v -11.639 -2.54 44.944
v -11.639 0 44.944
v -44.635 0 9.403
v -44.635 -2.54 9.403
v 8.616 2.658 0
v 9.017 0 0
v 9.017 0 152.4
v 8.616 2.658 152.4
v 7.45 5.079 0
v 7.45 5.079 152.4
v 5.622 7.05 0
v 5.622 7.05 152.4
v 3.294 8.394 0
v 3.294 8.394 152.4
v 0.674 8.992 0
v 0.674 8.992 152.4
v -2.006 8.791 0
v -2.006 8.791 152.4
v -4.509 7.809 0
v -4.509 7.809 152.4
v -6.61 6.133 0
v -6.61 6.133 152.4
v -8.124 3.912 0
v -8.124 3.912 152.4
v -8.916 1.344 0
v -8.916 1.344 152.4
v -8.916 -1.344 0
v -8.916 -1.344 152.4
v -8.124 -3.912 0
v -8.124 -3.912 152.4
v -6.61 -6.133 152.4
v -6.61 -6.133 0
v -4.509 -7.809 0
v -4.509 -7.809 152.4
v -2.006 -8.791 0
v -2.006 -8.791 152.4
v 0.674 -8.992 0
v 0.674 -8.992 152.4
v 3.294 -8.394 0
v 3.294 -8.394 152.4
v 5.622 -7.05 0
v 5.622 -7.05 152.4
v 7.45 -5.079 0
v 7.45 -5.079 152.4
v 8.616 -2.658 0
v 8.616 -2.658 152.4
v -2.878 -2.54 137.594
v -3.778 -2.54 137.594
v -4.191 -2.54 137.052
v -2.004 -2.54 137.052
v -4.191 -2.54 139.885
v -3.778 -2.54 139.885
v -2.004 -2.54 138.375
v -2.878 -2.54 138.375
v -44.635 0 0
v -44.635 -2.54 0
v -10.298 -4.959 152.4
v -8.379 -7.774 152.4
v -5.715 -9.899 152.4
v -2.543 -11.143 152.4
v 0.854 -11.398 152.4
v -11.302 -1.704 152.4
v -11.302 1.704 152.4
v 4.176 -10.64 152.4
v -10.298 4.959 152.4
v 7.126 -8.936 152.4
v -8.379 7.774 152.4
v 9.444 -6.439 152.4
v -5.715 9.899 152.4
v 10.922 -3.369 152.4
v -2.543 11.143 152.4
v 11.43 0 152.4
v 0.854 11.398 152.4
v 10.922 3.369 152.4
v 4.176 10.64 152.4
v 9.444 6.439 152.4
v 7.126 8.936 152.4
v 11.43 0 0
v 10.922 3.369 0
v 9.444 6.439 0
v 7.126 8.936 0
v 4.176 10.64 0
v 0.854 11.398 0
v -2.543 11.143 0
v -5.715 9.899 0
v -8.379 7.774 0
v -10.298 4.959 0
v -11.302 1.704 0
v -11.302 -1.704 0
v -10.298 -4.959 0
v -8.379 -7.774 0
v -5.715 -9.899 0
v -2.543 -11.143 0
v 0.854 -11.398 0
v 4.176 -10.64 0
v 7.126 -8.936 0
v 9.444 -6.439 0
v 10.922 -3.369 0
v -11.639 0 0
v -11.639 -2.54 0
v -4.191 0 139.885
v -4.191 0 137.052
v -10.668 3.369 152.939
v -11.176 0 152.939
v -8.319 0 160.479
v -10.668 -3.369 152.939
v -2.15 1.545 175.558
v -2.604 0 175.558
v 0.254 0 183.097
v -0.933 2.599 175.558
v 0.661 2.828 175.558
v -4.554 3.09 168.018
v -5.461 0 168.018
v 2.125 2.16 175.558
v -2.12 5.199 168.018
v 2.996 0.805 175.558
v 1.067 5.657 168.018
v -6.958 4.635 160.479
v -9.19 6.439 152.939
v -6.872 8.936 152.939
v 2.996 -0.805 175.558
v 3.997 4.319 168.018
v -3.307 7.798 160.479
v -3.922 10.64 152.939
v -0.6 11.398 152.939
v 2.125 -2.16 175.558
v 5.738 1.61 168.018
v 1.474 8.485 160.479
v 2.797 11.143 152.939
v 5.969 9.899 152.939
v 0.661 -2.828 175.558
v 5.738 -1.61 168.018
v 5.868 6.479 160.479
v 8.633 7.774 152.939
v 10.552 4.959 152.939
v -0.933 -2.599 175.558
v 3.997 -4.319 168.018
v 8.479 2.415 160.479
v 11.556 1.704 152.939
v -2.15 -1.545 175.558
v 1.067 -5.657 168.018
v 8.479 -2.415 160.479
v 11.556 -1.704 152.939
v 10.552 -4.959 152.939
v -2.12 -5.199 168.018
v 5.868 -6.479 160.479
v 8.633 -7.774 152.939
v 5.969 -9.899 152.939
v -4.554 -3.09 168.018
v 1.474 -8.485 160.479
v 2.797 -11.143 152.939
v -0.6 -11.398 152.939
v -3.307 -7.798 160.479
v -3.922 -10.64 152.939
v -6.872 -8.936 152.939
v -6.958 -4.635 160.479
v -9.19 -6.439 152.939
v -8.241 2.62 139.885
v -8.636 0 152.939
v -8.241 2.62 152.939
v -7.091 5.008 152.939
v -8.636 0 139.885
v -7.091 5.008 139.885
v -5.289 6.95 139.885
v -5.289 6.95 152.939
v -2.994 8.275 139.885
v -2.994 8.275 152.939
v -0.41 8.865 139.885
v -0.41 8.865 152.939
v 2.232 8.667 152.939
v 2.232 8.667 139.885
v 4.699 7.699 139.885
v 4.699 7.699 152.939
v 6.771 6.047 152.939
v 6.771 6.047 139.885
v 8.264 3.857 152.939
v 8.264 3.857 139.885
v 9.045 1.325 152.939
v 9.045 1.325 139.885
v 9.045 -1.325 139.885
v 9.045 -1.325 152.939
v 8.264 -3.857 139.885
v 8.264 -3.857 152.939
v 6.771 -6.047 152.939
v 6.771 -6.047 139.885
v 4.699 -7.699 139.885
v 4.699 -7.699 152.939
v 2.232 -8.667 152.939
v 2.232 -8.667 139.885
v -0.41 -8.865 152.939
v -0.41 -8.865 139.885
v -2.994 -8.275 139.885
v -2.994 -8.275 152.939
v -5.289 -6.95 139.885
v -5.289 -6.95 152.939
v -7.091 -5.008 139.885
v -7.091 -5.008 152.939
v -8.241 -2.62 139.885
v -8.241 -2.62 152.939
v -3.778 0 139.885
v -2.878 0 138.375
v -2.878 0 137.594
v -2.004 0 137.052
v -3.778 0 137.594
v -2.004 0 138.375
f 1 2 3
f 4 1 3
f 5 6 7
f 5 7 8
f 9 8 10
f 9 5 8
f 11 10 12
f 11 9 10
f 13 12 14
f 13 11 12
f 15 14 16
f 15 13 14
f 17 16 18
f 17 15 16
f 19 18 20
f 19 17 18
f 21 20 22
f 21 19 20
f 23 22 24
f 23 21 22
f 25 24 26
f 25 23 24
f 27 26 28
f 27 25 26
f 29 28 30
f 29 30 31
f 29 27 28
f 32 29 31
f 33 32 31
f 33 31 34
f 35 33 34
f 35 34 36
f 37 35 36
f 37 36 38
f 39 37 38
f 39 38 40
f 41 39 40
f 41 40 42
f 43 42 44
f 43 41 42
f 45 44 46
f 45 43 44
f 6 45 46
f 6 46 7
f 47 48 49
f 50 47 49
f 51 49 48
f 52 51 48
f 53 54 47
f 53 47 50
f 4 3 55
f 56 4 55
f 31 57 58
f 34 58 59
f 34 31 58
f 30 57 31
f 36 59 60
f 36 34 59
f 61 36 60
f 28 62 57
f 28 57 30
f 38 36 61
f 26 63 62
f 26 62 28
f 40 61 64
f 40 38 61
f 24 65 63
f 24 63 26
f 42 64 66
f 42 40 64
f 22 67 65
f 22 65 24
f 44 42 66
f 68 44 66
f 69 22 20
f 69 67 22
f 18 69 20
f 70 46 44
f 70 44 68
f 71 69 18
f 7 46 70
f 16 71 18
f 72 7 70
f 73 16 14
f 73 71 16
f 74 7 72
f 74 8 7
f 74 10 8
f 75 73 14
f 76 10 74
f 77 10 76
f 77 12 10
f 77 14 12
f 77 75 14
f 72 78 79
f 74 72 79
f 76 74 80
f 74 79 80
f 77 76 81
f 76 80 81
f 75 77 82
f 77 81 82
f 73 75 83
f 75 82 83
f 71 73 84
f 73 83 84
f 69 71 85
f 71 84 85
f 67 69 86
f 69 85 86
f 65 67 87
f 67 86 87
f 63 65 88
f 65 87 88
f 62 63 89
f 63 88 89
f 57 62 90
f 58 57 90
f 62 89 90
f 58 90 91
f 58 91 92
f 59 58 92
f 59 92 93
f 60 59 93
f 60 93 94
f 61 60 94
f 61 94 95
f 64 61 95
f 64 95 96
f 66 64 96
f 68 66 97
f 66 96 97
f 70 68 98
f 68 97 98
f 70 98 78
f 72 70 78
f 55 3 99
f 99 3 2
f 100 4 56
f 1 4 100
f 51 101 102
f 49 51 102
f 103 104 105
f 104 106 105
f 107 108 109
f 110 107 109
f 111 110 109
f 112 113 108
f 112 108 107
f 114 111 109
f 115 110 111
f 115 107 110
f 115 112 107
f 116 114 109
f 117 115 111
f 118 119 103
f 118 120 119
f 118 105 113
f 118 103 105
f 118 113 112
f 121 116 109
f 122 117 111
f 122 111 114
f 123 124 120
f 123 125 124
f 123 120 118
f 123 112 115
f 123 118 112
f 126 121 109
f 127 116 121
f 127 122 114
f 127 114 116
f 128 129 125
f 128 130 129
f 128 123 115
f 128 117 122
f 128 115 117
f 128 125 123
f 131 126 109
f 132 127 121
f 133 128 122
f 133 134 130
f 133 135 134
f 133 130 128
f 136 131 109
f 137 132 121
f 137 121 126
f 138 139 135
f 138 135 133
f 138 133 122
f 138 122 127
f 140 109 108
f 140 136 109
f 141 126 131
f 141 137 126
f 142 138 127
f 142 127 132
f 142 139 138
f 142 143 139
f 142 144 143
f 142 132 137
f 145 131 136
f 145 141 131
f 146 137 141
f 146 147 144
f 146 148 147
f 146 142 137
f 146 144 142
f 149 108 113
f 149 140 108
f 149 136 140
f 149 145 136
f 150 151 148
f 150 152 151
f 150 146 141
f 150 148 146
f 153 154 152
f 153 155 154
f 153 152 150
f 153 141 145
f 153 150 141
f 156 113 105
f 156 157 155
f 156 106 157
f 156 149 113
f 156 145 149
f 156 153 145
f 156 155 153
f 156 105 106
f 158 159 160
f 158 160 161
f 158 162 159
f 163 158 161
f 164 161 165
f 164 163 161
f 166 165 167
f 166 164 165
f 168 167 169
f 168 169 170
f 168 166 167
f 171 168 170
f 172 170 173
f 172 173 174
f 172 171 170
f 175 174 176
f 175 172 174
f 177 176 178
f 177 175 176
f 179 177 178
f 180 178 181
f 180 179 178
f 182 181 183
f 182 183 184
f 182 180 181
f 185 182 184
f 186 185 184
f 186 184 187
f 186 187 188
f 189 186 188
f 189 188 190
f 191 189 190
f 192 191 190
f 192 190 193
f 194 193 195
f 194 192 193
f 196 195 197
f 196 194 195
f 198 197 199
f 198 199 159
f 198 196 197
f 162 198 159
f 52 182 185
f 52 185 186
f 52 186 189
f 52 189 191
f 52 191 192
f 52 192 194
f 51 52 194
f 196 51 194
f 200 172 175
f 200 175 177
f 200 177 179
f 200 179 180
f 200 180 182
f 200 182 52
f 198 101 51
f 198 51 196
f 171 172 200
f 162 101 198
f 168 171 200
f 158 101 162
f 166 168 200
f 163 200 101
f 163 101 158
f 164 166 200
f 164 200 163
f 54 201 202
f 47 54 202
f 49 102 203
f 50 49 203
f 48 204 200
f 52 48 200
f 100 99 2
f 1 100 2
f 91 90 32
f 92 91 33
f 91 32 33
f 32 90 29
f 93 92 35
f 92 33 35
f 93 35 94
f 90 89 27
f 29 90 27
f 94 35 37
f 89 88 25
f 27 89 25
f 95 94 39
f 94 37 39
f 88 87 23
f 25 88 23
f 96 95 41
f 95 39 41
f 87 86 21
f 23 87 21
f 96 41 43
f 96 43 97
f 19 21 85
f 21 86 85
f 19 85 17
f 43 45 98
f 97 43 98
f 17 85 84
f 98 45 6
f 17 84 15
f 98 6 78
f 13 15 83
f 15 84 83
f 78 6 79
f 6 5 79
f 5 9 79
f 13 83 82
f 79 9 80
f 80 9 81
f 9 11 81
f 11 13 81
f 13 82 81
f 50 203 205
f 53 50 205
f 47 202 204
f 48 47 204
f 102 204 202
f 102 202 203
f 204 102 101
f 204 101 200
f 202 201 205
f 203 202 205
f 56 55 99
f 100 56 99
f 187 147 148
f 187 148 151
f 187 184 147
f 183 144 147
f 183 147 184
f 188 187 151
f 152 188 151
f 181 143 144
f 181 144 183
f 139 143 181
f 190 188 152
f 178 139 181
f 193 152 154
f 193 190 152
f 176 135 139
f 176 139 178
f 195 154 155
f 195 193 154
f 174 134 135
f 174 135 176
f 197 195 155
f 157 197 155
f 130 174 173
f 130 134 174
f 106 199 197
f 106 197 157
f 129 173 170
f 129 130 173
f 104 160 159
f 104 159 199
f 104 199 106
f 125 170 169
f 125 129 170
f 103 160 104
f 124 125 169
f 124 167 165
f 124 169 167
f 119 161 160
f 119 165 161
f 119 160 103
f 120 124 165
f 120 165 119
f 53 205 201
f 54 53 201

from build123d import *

# Parameters (mm, degrees)
F0_R     = 11.43
F0_R_2   = 9.017
F1_DEPTH = 152.4
F3_DEPTH = 2.54
F6_DEPTH = 2.54


with BuildPart() as f1:
    # F0 (on Top) → F1 (new body)
    with BuildSketch(Plane.XY):
        Circle(F0_R)
        Circle(F0_R_2, mode=Mode.SUBTRACT)
    extrude(amount=F1_DEPTH)


with BuildPart() as f3:
    # F2 (on Front) → F3 (new body)
    with BuildSketch(Plane.XZ):
        Polygon((-44.635326, 0), (-11.638614, 0), (-11.638614, 44.944156), (-44.635326, 9.403175), align=None)
    extrude(amount=F3_DEPTH)


with BuildPart() as f5:
    # F4 (on Front) → F5 (revolve)
    with BuildSketch(Plane.XZ):
        Polygon((0.254, 139.885277), (0.254, 183.097425), (-11.176, 152.938947), (-8.636, 152.938947), (-8.636, 139.885277), (-4.191, 139.885277), (-3.778456, 139.885277), align=None)
    revolve(axis=Axis((0.254, 0, 161.491351), (0, 0, -1)))

    # F4 (on Front) → F6 (join)
    with BuildSketch(Plane.XZ):
        Polygon((-3.778456, 137.594208), (-3.778456, 139.885277), (-4.191, 139.885277), (-4.191, 137.051687), (-2.004395, 137.051687), (-2.004395, 138.375387), (-2.877722, 138.375387), (-2.877722, 137.594208), align=None)
    extrude(amount=F6_DEPTH)


solid = Compound([f1.part, f3.part, f5.part])
